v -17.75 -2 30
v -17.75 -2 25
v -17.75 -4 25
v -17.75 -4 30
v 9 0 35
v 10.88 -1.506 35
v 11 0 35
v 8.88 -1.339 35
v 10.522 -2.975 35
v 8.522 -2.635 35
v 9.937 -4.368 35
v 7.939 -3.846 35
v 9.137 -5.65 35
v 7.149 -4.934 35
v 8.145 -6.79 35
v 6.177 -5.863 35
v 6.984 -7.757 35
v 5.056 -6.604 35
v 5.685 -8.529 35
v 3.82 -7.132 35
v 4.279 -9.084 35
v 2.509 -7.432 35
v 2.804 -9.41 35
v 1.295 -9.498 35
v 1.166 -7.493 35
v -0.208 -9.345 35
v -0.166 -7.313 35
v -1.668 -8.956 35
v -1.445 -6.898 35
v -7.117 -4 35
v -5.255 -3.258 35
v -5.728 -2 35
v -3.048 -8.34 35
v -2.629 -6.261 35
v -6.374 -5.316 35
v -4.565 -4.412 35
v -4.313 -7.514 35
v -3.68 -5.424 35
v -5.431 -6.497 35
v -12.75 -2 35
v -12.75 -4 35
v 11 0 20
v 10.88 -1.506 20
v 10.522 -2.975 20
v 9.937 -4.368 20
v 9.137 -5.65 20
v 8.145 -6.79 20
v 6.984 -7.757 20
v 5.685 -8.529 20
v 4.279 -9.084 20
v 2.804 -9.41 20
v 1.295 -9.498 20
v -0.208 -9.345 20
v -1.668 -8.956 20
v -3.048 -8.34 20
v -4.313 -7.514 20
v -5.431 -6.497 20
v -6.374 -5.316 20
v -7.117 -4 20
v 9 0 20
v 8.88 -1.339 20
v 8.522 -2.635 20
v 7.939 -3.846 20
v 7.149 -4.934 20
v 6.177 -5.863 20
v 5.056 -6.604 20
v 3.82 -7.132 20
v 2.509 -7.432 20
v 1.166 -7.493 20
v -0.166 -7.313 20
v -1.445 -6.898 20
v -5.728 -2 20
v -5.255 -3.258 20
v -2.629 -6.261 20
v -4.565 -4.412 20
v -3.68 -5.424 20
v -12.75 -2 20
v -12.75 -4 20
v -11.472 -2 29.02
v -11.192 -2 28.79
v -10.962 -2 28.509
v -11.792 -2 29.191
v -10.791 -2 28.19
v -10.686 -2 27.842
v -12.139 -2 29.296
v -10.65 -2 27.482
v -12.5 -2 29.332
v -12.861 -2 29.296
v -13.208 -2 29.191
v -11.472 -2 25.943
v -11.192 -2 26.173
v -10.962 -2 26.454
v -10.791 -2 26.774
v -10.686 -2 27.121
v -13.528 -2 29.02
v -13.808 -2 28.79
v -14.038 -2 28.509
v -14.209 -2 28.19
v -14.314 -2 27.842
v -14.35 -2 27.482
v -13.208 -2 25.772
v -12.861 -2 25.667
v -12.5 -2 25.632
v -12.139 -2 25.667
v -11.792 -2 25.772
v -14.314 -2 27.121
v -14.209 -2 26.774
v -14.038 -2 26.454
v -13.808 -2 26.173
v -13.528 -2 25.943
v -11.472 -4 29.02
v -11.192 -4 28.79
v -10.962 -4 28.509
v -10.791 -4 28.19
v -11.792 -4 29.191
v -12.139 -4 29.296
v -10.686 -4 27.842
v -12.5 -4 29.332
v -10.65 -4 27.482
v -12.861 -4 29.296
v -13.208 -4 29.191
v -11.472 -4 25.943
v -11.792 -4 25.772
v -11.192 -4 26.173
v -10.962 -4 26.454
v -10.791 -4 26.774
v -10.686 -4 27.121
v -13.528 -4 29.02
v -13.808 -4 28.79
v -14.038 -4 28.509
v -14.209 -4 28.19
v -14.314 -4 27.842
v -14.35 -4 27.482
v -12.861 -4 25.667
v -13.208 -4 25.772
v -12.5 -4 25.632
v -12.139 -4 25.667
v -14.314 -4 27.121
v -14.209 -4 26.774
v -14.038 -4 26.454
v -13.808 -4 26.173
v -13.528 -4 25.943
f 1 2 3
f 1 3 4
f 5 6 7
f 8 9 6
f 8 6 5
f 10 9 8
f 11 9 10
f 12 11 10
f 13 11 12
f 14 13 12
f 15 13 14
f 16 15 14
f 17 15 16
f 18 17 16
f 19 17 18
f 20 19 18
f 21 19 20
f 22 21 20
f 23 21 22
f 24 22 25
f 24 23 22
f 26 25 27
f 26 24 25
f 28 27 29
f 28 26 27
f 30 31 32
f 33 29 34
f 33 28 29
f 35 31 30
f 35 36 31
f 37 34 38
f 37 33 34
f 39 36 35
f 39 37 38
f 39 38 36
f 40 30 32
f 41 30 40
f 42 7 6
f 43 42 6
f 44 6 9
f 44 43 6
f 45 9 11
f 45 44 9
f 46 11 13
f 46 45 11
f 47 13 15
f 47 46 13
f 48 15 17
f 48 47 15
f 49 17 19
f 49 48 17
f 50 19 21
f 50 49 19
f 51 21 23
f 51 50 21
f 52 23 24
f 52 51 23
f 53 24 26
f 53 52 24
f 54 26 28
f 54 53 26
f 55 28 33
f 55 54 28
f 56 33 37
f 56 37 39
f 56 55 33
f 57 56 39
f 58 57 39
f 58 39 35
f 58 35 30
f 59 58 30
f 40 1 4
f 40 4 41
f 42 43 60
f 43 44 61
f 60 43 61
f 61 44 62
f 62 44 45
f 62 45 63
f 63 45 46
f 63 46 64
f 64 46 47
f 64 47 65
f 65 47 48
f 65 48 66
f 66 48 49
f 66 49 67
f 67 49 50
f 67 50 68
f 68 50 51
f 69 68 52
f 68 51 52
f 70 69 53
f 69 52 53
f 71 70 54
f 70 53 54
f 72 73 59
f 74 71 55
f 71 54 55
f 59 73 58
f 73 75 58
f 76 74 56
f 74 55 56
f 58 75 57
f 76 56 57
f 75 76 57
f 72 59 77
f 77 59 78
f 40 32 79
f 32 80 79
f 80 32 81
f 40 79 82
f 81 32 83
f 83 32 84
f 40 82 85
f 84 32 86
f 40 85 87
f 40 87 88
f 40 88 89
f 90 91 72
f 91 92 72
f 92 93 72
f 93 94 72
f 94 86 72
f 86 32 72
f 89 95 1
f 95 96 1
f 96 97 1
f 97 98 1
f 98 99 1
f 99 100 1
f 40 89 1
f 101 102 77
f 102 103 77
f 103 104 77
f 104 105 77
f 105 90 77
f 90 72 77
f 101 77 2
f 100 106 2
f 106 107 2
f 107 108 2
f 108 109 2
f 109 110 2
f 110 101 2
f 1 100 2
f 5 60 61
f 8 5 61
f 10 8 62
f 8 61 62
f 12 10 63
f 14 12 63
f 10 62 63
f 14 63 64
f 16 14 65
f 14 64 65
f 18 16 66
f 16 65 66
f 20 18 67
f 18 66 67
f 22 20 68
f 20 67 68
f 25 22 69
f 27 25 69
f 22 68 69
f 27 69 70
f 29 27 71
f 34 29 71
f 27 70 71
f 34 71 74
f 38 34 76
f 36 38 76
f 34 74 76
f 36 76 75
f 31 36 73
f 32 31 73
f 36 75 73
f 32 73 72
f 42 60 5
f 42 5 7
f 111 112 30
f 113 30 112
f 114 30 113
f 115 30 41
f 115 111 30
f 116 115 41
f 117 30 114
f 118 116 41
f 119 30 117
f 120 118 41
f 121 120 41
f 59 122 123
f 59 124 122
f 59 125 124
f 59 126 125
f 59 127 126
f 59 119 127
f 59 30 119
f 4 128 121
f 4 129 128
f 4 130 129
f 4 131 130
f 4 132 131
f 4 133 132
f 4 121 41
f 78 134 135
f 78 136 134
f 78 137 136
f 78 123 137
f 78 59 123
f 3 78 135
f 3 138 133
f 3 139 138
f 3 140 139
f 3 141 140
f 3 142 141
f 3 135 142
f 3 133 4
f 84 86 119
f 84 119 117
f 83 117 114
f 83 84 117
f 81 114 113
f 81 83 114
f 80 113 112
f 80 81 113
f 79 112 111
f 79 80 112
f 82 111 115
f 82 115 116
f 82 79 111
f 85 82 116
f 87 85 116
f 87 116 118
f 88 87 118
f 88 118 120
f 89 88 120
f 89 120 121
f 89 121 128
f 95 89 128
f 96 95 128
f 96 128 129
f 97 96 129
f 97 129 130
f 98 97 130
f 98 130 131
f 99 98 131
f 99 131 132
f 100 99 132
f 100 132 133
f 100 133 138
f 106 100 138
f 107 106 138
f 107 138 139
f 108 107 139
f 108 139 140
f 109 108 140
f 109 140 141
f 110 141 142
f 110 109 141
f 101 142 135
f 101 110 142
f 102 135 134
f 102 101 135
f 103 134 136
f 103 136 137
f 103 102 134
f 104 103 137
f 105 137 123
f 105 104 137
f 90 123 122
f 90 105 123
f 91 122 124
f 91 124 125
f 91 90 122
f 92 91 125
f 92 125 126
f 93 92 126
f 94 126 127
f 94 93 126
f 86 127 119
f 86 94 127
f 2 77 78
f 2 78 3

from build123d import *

# Parameters (mm, degrees)
SKETCH016_R       = 1.85
EXTRUDE013_DEPTH  = 12
CYLINDER007_R     = 5
CYLINDER007_DEPTH = 1
EXTRUDE012_DEPTH  = 15


with BuildPart() as extrude013:
    # Sketch016 → Extrude013 (new body)
    with BuildSketch(Plane.XZ):
        Polygon((11.75, 36), (11.75, 19), (-13.25, 19), (-19.25, 25), (-19.25, 30), (-13.25, 36), align=None)
        with Locations((-14, 27.481564)):
            Circle(SKETCH016_R, mode=Mode.SUBTRACT)
    extrude(amount=-EXTRUDE013_DEPTH)


with BuildPart() as unprintable:
    # Cylinder007 → Cylinder007 (new body)
    with BuildSketch(Plane(origin=(-14, 18, 27.5), x_dir=(1, 0, 0), z_dir=(0, -1, 0))):
        Circle(CYLINDER007_R)
    extrude(amount=CYLINDER007_DEPTH)


with BuildPart() as body007:
    # Sketch015 → Extrude012 (new body)
    with BuildSketch(Plane.XY.offset(50)):
        with BuildLine():
            ThreePointArc((7.5, 0), (1.009178, 7.431794), (-7.228416, 2))
            Line((-7.228416, 2), (-21.228416, 2))
            Line((-21.228416, 4), (-21.228416, 2))
            Line((-8.616844, 4), (-21.228416, 4))
            ThreePointArc((9.5, 0), (2.048168, 9.276584), (-8.616844, 4))
            Line((7.5, 0), (9.5, 0))
        make_face()
    extrude(amount=EXTRUDE012_DEPTH)


with BuildPart() as body007_1:
    # Extrude012 placement: moved
    add(body007.part.moved(Location((0, 0, -30))))

    # Fusion016: union unprintable
    add(unprintable.part)

    # Common001: intersect Extrude013
    add(extrude013.part, mode=Mode.INTERSECT)


with BuildPart() as body007_2:
    # Common001 placement: moved
    add(body007_1.part.moved(Location((1.5, 0, 0))))


with BuildPart() as body007_3:
    # Clone007 placement: moved
    add(body007_2.part.moved(Location((-1.5, 0, 0))))


with BuildPart() as part_mirroring008:
    # Part__Mirroring008: instance of Body007
    add(body007_3.part.mirror(Plane(origin=(0, 0, 0), x_dir=(1, 0, 0), z_dir=(0, 1, 0))))


with BuildPart() as part_mirroring008_1:
    # Part__Mirroring008 placement: moved
    add(part_mirroring008.part.moved(Location((1.5, 0, 0))))


solid = part_mirroring008_1.part
